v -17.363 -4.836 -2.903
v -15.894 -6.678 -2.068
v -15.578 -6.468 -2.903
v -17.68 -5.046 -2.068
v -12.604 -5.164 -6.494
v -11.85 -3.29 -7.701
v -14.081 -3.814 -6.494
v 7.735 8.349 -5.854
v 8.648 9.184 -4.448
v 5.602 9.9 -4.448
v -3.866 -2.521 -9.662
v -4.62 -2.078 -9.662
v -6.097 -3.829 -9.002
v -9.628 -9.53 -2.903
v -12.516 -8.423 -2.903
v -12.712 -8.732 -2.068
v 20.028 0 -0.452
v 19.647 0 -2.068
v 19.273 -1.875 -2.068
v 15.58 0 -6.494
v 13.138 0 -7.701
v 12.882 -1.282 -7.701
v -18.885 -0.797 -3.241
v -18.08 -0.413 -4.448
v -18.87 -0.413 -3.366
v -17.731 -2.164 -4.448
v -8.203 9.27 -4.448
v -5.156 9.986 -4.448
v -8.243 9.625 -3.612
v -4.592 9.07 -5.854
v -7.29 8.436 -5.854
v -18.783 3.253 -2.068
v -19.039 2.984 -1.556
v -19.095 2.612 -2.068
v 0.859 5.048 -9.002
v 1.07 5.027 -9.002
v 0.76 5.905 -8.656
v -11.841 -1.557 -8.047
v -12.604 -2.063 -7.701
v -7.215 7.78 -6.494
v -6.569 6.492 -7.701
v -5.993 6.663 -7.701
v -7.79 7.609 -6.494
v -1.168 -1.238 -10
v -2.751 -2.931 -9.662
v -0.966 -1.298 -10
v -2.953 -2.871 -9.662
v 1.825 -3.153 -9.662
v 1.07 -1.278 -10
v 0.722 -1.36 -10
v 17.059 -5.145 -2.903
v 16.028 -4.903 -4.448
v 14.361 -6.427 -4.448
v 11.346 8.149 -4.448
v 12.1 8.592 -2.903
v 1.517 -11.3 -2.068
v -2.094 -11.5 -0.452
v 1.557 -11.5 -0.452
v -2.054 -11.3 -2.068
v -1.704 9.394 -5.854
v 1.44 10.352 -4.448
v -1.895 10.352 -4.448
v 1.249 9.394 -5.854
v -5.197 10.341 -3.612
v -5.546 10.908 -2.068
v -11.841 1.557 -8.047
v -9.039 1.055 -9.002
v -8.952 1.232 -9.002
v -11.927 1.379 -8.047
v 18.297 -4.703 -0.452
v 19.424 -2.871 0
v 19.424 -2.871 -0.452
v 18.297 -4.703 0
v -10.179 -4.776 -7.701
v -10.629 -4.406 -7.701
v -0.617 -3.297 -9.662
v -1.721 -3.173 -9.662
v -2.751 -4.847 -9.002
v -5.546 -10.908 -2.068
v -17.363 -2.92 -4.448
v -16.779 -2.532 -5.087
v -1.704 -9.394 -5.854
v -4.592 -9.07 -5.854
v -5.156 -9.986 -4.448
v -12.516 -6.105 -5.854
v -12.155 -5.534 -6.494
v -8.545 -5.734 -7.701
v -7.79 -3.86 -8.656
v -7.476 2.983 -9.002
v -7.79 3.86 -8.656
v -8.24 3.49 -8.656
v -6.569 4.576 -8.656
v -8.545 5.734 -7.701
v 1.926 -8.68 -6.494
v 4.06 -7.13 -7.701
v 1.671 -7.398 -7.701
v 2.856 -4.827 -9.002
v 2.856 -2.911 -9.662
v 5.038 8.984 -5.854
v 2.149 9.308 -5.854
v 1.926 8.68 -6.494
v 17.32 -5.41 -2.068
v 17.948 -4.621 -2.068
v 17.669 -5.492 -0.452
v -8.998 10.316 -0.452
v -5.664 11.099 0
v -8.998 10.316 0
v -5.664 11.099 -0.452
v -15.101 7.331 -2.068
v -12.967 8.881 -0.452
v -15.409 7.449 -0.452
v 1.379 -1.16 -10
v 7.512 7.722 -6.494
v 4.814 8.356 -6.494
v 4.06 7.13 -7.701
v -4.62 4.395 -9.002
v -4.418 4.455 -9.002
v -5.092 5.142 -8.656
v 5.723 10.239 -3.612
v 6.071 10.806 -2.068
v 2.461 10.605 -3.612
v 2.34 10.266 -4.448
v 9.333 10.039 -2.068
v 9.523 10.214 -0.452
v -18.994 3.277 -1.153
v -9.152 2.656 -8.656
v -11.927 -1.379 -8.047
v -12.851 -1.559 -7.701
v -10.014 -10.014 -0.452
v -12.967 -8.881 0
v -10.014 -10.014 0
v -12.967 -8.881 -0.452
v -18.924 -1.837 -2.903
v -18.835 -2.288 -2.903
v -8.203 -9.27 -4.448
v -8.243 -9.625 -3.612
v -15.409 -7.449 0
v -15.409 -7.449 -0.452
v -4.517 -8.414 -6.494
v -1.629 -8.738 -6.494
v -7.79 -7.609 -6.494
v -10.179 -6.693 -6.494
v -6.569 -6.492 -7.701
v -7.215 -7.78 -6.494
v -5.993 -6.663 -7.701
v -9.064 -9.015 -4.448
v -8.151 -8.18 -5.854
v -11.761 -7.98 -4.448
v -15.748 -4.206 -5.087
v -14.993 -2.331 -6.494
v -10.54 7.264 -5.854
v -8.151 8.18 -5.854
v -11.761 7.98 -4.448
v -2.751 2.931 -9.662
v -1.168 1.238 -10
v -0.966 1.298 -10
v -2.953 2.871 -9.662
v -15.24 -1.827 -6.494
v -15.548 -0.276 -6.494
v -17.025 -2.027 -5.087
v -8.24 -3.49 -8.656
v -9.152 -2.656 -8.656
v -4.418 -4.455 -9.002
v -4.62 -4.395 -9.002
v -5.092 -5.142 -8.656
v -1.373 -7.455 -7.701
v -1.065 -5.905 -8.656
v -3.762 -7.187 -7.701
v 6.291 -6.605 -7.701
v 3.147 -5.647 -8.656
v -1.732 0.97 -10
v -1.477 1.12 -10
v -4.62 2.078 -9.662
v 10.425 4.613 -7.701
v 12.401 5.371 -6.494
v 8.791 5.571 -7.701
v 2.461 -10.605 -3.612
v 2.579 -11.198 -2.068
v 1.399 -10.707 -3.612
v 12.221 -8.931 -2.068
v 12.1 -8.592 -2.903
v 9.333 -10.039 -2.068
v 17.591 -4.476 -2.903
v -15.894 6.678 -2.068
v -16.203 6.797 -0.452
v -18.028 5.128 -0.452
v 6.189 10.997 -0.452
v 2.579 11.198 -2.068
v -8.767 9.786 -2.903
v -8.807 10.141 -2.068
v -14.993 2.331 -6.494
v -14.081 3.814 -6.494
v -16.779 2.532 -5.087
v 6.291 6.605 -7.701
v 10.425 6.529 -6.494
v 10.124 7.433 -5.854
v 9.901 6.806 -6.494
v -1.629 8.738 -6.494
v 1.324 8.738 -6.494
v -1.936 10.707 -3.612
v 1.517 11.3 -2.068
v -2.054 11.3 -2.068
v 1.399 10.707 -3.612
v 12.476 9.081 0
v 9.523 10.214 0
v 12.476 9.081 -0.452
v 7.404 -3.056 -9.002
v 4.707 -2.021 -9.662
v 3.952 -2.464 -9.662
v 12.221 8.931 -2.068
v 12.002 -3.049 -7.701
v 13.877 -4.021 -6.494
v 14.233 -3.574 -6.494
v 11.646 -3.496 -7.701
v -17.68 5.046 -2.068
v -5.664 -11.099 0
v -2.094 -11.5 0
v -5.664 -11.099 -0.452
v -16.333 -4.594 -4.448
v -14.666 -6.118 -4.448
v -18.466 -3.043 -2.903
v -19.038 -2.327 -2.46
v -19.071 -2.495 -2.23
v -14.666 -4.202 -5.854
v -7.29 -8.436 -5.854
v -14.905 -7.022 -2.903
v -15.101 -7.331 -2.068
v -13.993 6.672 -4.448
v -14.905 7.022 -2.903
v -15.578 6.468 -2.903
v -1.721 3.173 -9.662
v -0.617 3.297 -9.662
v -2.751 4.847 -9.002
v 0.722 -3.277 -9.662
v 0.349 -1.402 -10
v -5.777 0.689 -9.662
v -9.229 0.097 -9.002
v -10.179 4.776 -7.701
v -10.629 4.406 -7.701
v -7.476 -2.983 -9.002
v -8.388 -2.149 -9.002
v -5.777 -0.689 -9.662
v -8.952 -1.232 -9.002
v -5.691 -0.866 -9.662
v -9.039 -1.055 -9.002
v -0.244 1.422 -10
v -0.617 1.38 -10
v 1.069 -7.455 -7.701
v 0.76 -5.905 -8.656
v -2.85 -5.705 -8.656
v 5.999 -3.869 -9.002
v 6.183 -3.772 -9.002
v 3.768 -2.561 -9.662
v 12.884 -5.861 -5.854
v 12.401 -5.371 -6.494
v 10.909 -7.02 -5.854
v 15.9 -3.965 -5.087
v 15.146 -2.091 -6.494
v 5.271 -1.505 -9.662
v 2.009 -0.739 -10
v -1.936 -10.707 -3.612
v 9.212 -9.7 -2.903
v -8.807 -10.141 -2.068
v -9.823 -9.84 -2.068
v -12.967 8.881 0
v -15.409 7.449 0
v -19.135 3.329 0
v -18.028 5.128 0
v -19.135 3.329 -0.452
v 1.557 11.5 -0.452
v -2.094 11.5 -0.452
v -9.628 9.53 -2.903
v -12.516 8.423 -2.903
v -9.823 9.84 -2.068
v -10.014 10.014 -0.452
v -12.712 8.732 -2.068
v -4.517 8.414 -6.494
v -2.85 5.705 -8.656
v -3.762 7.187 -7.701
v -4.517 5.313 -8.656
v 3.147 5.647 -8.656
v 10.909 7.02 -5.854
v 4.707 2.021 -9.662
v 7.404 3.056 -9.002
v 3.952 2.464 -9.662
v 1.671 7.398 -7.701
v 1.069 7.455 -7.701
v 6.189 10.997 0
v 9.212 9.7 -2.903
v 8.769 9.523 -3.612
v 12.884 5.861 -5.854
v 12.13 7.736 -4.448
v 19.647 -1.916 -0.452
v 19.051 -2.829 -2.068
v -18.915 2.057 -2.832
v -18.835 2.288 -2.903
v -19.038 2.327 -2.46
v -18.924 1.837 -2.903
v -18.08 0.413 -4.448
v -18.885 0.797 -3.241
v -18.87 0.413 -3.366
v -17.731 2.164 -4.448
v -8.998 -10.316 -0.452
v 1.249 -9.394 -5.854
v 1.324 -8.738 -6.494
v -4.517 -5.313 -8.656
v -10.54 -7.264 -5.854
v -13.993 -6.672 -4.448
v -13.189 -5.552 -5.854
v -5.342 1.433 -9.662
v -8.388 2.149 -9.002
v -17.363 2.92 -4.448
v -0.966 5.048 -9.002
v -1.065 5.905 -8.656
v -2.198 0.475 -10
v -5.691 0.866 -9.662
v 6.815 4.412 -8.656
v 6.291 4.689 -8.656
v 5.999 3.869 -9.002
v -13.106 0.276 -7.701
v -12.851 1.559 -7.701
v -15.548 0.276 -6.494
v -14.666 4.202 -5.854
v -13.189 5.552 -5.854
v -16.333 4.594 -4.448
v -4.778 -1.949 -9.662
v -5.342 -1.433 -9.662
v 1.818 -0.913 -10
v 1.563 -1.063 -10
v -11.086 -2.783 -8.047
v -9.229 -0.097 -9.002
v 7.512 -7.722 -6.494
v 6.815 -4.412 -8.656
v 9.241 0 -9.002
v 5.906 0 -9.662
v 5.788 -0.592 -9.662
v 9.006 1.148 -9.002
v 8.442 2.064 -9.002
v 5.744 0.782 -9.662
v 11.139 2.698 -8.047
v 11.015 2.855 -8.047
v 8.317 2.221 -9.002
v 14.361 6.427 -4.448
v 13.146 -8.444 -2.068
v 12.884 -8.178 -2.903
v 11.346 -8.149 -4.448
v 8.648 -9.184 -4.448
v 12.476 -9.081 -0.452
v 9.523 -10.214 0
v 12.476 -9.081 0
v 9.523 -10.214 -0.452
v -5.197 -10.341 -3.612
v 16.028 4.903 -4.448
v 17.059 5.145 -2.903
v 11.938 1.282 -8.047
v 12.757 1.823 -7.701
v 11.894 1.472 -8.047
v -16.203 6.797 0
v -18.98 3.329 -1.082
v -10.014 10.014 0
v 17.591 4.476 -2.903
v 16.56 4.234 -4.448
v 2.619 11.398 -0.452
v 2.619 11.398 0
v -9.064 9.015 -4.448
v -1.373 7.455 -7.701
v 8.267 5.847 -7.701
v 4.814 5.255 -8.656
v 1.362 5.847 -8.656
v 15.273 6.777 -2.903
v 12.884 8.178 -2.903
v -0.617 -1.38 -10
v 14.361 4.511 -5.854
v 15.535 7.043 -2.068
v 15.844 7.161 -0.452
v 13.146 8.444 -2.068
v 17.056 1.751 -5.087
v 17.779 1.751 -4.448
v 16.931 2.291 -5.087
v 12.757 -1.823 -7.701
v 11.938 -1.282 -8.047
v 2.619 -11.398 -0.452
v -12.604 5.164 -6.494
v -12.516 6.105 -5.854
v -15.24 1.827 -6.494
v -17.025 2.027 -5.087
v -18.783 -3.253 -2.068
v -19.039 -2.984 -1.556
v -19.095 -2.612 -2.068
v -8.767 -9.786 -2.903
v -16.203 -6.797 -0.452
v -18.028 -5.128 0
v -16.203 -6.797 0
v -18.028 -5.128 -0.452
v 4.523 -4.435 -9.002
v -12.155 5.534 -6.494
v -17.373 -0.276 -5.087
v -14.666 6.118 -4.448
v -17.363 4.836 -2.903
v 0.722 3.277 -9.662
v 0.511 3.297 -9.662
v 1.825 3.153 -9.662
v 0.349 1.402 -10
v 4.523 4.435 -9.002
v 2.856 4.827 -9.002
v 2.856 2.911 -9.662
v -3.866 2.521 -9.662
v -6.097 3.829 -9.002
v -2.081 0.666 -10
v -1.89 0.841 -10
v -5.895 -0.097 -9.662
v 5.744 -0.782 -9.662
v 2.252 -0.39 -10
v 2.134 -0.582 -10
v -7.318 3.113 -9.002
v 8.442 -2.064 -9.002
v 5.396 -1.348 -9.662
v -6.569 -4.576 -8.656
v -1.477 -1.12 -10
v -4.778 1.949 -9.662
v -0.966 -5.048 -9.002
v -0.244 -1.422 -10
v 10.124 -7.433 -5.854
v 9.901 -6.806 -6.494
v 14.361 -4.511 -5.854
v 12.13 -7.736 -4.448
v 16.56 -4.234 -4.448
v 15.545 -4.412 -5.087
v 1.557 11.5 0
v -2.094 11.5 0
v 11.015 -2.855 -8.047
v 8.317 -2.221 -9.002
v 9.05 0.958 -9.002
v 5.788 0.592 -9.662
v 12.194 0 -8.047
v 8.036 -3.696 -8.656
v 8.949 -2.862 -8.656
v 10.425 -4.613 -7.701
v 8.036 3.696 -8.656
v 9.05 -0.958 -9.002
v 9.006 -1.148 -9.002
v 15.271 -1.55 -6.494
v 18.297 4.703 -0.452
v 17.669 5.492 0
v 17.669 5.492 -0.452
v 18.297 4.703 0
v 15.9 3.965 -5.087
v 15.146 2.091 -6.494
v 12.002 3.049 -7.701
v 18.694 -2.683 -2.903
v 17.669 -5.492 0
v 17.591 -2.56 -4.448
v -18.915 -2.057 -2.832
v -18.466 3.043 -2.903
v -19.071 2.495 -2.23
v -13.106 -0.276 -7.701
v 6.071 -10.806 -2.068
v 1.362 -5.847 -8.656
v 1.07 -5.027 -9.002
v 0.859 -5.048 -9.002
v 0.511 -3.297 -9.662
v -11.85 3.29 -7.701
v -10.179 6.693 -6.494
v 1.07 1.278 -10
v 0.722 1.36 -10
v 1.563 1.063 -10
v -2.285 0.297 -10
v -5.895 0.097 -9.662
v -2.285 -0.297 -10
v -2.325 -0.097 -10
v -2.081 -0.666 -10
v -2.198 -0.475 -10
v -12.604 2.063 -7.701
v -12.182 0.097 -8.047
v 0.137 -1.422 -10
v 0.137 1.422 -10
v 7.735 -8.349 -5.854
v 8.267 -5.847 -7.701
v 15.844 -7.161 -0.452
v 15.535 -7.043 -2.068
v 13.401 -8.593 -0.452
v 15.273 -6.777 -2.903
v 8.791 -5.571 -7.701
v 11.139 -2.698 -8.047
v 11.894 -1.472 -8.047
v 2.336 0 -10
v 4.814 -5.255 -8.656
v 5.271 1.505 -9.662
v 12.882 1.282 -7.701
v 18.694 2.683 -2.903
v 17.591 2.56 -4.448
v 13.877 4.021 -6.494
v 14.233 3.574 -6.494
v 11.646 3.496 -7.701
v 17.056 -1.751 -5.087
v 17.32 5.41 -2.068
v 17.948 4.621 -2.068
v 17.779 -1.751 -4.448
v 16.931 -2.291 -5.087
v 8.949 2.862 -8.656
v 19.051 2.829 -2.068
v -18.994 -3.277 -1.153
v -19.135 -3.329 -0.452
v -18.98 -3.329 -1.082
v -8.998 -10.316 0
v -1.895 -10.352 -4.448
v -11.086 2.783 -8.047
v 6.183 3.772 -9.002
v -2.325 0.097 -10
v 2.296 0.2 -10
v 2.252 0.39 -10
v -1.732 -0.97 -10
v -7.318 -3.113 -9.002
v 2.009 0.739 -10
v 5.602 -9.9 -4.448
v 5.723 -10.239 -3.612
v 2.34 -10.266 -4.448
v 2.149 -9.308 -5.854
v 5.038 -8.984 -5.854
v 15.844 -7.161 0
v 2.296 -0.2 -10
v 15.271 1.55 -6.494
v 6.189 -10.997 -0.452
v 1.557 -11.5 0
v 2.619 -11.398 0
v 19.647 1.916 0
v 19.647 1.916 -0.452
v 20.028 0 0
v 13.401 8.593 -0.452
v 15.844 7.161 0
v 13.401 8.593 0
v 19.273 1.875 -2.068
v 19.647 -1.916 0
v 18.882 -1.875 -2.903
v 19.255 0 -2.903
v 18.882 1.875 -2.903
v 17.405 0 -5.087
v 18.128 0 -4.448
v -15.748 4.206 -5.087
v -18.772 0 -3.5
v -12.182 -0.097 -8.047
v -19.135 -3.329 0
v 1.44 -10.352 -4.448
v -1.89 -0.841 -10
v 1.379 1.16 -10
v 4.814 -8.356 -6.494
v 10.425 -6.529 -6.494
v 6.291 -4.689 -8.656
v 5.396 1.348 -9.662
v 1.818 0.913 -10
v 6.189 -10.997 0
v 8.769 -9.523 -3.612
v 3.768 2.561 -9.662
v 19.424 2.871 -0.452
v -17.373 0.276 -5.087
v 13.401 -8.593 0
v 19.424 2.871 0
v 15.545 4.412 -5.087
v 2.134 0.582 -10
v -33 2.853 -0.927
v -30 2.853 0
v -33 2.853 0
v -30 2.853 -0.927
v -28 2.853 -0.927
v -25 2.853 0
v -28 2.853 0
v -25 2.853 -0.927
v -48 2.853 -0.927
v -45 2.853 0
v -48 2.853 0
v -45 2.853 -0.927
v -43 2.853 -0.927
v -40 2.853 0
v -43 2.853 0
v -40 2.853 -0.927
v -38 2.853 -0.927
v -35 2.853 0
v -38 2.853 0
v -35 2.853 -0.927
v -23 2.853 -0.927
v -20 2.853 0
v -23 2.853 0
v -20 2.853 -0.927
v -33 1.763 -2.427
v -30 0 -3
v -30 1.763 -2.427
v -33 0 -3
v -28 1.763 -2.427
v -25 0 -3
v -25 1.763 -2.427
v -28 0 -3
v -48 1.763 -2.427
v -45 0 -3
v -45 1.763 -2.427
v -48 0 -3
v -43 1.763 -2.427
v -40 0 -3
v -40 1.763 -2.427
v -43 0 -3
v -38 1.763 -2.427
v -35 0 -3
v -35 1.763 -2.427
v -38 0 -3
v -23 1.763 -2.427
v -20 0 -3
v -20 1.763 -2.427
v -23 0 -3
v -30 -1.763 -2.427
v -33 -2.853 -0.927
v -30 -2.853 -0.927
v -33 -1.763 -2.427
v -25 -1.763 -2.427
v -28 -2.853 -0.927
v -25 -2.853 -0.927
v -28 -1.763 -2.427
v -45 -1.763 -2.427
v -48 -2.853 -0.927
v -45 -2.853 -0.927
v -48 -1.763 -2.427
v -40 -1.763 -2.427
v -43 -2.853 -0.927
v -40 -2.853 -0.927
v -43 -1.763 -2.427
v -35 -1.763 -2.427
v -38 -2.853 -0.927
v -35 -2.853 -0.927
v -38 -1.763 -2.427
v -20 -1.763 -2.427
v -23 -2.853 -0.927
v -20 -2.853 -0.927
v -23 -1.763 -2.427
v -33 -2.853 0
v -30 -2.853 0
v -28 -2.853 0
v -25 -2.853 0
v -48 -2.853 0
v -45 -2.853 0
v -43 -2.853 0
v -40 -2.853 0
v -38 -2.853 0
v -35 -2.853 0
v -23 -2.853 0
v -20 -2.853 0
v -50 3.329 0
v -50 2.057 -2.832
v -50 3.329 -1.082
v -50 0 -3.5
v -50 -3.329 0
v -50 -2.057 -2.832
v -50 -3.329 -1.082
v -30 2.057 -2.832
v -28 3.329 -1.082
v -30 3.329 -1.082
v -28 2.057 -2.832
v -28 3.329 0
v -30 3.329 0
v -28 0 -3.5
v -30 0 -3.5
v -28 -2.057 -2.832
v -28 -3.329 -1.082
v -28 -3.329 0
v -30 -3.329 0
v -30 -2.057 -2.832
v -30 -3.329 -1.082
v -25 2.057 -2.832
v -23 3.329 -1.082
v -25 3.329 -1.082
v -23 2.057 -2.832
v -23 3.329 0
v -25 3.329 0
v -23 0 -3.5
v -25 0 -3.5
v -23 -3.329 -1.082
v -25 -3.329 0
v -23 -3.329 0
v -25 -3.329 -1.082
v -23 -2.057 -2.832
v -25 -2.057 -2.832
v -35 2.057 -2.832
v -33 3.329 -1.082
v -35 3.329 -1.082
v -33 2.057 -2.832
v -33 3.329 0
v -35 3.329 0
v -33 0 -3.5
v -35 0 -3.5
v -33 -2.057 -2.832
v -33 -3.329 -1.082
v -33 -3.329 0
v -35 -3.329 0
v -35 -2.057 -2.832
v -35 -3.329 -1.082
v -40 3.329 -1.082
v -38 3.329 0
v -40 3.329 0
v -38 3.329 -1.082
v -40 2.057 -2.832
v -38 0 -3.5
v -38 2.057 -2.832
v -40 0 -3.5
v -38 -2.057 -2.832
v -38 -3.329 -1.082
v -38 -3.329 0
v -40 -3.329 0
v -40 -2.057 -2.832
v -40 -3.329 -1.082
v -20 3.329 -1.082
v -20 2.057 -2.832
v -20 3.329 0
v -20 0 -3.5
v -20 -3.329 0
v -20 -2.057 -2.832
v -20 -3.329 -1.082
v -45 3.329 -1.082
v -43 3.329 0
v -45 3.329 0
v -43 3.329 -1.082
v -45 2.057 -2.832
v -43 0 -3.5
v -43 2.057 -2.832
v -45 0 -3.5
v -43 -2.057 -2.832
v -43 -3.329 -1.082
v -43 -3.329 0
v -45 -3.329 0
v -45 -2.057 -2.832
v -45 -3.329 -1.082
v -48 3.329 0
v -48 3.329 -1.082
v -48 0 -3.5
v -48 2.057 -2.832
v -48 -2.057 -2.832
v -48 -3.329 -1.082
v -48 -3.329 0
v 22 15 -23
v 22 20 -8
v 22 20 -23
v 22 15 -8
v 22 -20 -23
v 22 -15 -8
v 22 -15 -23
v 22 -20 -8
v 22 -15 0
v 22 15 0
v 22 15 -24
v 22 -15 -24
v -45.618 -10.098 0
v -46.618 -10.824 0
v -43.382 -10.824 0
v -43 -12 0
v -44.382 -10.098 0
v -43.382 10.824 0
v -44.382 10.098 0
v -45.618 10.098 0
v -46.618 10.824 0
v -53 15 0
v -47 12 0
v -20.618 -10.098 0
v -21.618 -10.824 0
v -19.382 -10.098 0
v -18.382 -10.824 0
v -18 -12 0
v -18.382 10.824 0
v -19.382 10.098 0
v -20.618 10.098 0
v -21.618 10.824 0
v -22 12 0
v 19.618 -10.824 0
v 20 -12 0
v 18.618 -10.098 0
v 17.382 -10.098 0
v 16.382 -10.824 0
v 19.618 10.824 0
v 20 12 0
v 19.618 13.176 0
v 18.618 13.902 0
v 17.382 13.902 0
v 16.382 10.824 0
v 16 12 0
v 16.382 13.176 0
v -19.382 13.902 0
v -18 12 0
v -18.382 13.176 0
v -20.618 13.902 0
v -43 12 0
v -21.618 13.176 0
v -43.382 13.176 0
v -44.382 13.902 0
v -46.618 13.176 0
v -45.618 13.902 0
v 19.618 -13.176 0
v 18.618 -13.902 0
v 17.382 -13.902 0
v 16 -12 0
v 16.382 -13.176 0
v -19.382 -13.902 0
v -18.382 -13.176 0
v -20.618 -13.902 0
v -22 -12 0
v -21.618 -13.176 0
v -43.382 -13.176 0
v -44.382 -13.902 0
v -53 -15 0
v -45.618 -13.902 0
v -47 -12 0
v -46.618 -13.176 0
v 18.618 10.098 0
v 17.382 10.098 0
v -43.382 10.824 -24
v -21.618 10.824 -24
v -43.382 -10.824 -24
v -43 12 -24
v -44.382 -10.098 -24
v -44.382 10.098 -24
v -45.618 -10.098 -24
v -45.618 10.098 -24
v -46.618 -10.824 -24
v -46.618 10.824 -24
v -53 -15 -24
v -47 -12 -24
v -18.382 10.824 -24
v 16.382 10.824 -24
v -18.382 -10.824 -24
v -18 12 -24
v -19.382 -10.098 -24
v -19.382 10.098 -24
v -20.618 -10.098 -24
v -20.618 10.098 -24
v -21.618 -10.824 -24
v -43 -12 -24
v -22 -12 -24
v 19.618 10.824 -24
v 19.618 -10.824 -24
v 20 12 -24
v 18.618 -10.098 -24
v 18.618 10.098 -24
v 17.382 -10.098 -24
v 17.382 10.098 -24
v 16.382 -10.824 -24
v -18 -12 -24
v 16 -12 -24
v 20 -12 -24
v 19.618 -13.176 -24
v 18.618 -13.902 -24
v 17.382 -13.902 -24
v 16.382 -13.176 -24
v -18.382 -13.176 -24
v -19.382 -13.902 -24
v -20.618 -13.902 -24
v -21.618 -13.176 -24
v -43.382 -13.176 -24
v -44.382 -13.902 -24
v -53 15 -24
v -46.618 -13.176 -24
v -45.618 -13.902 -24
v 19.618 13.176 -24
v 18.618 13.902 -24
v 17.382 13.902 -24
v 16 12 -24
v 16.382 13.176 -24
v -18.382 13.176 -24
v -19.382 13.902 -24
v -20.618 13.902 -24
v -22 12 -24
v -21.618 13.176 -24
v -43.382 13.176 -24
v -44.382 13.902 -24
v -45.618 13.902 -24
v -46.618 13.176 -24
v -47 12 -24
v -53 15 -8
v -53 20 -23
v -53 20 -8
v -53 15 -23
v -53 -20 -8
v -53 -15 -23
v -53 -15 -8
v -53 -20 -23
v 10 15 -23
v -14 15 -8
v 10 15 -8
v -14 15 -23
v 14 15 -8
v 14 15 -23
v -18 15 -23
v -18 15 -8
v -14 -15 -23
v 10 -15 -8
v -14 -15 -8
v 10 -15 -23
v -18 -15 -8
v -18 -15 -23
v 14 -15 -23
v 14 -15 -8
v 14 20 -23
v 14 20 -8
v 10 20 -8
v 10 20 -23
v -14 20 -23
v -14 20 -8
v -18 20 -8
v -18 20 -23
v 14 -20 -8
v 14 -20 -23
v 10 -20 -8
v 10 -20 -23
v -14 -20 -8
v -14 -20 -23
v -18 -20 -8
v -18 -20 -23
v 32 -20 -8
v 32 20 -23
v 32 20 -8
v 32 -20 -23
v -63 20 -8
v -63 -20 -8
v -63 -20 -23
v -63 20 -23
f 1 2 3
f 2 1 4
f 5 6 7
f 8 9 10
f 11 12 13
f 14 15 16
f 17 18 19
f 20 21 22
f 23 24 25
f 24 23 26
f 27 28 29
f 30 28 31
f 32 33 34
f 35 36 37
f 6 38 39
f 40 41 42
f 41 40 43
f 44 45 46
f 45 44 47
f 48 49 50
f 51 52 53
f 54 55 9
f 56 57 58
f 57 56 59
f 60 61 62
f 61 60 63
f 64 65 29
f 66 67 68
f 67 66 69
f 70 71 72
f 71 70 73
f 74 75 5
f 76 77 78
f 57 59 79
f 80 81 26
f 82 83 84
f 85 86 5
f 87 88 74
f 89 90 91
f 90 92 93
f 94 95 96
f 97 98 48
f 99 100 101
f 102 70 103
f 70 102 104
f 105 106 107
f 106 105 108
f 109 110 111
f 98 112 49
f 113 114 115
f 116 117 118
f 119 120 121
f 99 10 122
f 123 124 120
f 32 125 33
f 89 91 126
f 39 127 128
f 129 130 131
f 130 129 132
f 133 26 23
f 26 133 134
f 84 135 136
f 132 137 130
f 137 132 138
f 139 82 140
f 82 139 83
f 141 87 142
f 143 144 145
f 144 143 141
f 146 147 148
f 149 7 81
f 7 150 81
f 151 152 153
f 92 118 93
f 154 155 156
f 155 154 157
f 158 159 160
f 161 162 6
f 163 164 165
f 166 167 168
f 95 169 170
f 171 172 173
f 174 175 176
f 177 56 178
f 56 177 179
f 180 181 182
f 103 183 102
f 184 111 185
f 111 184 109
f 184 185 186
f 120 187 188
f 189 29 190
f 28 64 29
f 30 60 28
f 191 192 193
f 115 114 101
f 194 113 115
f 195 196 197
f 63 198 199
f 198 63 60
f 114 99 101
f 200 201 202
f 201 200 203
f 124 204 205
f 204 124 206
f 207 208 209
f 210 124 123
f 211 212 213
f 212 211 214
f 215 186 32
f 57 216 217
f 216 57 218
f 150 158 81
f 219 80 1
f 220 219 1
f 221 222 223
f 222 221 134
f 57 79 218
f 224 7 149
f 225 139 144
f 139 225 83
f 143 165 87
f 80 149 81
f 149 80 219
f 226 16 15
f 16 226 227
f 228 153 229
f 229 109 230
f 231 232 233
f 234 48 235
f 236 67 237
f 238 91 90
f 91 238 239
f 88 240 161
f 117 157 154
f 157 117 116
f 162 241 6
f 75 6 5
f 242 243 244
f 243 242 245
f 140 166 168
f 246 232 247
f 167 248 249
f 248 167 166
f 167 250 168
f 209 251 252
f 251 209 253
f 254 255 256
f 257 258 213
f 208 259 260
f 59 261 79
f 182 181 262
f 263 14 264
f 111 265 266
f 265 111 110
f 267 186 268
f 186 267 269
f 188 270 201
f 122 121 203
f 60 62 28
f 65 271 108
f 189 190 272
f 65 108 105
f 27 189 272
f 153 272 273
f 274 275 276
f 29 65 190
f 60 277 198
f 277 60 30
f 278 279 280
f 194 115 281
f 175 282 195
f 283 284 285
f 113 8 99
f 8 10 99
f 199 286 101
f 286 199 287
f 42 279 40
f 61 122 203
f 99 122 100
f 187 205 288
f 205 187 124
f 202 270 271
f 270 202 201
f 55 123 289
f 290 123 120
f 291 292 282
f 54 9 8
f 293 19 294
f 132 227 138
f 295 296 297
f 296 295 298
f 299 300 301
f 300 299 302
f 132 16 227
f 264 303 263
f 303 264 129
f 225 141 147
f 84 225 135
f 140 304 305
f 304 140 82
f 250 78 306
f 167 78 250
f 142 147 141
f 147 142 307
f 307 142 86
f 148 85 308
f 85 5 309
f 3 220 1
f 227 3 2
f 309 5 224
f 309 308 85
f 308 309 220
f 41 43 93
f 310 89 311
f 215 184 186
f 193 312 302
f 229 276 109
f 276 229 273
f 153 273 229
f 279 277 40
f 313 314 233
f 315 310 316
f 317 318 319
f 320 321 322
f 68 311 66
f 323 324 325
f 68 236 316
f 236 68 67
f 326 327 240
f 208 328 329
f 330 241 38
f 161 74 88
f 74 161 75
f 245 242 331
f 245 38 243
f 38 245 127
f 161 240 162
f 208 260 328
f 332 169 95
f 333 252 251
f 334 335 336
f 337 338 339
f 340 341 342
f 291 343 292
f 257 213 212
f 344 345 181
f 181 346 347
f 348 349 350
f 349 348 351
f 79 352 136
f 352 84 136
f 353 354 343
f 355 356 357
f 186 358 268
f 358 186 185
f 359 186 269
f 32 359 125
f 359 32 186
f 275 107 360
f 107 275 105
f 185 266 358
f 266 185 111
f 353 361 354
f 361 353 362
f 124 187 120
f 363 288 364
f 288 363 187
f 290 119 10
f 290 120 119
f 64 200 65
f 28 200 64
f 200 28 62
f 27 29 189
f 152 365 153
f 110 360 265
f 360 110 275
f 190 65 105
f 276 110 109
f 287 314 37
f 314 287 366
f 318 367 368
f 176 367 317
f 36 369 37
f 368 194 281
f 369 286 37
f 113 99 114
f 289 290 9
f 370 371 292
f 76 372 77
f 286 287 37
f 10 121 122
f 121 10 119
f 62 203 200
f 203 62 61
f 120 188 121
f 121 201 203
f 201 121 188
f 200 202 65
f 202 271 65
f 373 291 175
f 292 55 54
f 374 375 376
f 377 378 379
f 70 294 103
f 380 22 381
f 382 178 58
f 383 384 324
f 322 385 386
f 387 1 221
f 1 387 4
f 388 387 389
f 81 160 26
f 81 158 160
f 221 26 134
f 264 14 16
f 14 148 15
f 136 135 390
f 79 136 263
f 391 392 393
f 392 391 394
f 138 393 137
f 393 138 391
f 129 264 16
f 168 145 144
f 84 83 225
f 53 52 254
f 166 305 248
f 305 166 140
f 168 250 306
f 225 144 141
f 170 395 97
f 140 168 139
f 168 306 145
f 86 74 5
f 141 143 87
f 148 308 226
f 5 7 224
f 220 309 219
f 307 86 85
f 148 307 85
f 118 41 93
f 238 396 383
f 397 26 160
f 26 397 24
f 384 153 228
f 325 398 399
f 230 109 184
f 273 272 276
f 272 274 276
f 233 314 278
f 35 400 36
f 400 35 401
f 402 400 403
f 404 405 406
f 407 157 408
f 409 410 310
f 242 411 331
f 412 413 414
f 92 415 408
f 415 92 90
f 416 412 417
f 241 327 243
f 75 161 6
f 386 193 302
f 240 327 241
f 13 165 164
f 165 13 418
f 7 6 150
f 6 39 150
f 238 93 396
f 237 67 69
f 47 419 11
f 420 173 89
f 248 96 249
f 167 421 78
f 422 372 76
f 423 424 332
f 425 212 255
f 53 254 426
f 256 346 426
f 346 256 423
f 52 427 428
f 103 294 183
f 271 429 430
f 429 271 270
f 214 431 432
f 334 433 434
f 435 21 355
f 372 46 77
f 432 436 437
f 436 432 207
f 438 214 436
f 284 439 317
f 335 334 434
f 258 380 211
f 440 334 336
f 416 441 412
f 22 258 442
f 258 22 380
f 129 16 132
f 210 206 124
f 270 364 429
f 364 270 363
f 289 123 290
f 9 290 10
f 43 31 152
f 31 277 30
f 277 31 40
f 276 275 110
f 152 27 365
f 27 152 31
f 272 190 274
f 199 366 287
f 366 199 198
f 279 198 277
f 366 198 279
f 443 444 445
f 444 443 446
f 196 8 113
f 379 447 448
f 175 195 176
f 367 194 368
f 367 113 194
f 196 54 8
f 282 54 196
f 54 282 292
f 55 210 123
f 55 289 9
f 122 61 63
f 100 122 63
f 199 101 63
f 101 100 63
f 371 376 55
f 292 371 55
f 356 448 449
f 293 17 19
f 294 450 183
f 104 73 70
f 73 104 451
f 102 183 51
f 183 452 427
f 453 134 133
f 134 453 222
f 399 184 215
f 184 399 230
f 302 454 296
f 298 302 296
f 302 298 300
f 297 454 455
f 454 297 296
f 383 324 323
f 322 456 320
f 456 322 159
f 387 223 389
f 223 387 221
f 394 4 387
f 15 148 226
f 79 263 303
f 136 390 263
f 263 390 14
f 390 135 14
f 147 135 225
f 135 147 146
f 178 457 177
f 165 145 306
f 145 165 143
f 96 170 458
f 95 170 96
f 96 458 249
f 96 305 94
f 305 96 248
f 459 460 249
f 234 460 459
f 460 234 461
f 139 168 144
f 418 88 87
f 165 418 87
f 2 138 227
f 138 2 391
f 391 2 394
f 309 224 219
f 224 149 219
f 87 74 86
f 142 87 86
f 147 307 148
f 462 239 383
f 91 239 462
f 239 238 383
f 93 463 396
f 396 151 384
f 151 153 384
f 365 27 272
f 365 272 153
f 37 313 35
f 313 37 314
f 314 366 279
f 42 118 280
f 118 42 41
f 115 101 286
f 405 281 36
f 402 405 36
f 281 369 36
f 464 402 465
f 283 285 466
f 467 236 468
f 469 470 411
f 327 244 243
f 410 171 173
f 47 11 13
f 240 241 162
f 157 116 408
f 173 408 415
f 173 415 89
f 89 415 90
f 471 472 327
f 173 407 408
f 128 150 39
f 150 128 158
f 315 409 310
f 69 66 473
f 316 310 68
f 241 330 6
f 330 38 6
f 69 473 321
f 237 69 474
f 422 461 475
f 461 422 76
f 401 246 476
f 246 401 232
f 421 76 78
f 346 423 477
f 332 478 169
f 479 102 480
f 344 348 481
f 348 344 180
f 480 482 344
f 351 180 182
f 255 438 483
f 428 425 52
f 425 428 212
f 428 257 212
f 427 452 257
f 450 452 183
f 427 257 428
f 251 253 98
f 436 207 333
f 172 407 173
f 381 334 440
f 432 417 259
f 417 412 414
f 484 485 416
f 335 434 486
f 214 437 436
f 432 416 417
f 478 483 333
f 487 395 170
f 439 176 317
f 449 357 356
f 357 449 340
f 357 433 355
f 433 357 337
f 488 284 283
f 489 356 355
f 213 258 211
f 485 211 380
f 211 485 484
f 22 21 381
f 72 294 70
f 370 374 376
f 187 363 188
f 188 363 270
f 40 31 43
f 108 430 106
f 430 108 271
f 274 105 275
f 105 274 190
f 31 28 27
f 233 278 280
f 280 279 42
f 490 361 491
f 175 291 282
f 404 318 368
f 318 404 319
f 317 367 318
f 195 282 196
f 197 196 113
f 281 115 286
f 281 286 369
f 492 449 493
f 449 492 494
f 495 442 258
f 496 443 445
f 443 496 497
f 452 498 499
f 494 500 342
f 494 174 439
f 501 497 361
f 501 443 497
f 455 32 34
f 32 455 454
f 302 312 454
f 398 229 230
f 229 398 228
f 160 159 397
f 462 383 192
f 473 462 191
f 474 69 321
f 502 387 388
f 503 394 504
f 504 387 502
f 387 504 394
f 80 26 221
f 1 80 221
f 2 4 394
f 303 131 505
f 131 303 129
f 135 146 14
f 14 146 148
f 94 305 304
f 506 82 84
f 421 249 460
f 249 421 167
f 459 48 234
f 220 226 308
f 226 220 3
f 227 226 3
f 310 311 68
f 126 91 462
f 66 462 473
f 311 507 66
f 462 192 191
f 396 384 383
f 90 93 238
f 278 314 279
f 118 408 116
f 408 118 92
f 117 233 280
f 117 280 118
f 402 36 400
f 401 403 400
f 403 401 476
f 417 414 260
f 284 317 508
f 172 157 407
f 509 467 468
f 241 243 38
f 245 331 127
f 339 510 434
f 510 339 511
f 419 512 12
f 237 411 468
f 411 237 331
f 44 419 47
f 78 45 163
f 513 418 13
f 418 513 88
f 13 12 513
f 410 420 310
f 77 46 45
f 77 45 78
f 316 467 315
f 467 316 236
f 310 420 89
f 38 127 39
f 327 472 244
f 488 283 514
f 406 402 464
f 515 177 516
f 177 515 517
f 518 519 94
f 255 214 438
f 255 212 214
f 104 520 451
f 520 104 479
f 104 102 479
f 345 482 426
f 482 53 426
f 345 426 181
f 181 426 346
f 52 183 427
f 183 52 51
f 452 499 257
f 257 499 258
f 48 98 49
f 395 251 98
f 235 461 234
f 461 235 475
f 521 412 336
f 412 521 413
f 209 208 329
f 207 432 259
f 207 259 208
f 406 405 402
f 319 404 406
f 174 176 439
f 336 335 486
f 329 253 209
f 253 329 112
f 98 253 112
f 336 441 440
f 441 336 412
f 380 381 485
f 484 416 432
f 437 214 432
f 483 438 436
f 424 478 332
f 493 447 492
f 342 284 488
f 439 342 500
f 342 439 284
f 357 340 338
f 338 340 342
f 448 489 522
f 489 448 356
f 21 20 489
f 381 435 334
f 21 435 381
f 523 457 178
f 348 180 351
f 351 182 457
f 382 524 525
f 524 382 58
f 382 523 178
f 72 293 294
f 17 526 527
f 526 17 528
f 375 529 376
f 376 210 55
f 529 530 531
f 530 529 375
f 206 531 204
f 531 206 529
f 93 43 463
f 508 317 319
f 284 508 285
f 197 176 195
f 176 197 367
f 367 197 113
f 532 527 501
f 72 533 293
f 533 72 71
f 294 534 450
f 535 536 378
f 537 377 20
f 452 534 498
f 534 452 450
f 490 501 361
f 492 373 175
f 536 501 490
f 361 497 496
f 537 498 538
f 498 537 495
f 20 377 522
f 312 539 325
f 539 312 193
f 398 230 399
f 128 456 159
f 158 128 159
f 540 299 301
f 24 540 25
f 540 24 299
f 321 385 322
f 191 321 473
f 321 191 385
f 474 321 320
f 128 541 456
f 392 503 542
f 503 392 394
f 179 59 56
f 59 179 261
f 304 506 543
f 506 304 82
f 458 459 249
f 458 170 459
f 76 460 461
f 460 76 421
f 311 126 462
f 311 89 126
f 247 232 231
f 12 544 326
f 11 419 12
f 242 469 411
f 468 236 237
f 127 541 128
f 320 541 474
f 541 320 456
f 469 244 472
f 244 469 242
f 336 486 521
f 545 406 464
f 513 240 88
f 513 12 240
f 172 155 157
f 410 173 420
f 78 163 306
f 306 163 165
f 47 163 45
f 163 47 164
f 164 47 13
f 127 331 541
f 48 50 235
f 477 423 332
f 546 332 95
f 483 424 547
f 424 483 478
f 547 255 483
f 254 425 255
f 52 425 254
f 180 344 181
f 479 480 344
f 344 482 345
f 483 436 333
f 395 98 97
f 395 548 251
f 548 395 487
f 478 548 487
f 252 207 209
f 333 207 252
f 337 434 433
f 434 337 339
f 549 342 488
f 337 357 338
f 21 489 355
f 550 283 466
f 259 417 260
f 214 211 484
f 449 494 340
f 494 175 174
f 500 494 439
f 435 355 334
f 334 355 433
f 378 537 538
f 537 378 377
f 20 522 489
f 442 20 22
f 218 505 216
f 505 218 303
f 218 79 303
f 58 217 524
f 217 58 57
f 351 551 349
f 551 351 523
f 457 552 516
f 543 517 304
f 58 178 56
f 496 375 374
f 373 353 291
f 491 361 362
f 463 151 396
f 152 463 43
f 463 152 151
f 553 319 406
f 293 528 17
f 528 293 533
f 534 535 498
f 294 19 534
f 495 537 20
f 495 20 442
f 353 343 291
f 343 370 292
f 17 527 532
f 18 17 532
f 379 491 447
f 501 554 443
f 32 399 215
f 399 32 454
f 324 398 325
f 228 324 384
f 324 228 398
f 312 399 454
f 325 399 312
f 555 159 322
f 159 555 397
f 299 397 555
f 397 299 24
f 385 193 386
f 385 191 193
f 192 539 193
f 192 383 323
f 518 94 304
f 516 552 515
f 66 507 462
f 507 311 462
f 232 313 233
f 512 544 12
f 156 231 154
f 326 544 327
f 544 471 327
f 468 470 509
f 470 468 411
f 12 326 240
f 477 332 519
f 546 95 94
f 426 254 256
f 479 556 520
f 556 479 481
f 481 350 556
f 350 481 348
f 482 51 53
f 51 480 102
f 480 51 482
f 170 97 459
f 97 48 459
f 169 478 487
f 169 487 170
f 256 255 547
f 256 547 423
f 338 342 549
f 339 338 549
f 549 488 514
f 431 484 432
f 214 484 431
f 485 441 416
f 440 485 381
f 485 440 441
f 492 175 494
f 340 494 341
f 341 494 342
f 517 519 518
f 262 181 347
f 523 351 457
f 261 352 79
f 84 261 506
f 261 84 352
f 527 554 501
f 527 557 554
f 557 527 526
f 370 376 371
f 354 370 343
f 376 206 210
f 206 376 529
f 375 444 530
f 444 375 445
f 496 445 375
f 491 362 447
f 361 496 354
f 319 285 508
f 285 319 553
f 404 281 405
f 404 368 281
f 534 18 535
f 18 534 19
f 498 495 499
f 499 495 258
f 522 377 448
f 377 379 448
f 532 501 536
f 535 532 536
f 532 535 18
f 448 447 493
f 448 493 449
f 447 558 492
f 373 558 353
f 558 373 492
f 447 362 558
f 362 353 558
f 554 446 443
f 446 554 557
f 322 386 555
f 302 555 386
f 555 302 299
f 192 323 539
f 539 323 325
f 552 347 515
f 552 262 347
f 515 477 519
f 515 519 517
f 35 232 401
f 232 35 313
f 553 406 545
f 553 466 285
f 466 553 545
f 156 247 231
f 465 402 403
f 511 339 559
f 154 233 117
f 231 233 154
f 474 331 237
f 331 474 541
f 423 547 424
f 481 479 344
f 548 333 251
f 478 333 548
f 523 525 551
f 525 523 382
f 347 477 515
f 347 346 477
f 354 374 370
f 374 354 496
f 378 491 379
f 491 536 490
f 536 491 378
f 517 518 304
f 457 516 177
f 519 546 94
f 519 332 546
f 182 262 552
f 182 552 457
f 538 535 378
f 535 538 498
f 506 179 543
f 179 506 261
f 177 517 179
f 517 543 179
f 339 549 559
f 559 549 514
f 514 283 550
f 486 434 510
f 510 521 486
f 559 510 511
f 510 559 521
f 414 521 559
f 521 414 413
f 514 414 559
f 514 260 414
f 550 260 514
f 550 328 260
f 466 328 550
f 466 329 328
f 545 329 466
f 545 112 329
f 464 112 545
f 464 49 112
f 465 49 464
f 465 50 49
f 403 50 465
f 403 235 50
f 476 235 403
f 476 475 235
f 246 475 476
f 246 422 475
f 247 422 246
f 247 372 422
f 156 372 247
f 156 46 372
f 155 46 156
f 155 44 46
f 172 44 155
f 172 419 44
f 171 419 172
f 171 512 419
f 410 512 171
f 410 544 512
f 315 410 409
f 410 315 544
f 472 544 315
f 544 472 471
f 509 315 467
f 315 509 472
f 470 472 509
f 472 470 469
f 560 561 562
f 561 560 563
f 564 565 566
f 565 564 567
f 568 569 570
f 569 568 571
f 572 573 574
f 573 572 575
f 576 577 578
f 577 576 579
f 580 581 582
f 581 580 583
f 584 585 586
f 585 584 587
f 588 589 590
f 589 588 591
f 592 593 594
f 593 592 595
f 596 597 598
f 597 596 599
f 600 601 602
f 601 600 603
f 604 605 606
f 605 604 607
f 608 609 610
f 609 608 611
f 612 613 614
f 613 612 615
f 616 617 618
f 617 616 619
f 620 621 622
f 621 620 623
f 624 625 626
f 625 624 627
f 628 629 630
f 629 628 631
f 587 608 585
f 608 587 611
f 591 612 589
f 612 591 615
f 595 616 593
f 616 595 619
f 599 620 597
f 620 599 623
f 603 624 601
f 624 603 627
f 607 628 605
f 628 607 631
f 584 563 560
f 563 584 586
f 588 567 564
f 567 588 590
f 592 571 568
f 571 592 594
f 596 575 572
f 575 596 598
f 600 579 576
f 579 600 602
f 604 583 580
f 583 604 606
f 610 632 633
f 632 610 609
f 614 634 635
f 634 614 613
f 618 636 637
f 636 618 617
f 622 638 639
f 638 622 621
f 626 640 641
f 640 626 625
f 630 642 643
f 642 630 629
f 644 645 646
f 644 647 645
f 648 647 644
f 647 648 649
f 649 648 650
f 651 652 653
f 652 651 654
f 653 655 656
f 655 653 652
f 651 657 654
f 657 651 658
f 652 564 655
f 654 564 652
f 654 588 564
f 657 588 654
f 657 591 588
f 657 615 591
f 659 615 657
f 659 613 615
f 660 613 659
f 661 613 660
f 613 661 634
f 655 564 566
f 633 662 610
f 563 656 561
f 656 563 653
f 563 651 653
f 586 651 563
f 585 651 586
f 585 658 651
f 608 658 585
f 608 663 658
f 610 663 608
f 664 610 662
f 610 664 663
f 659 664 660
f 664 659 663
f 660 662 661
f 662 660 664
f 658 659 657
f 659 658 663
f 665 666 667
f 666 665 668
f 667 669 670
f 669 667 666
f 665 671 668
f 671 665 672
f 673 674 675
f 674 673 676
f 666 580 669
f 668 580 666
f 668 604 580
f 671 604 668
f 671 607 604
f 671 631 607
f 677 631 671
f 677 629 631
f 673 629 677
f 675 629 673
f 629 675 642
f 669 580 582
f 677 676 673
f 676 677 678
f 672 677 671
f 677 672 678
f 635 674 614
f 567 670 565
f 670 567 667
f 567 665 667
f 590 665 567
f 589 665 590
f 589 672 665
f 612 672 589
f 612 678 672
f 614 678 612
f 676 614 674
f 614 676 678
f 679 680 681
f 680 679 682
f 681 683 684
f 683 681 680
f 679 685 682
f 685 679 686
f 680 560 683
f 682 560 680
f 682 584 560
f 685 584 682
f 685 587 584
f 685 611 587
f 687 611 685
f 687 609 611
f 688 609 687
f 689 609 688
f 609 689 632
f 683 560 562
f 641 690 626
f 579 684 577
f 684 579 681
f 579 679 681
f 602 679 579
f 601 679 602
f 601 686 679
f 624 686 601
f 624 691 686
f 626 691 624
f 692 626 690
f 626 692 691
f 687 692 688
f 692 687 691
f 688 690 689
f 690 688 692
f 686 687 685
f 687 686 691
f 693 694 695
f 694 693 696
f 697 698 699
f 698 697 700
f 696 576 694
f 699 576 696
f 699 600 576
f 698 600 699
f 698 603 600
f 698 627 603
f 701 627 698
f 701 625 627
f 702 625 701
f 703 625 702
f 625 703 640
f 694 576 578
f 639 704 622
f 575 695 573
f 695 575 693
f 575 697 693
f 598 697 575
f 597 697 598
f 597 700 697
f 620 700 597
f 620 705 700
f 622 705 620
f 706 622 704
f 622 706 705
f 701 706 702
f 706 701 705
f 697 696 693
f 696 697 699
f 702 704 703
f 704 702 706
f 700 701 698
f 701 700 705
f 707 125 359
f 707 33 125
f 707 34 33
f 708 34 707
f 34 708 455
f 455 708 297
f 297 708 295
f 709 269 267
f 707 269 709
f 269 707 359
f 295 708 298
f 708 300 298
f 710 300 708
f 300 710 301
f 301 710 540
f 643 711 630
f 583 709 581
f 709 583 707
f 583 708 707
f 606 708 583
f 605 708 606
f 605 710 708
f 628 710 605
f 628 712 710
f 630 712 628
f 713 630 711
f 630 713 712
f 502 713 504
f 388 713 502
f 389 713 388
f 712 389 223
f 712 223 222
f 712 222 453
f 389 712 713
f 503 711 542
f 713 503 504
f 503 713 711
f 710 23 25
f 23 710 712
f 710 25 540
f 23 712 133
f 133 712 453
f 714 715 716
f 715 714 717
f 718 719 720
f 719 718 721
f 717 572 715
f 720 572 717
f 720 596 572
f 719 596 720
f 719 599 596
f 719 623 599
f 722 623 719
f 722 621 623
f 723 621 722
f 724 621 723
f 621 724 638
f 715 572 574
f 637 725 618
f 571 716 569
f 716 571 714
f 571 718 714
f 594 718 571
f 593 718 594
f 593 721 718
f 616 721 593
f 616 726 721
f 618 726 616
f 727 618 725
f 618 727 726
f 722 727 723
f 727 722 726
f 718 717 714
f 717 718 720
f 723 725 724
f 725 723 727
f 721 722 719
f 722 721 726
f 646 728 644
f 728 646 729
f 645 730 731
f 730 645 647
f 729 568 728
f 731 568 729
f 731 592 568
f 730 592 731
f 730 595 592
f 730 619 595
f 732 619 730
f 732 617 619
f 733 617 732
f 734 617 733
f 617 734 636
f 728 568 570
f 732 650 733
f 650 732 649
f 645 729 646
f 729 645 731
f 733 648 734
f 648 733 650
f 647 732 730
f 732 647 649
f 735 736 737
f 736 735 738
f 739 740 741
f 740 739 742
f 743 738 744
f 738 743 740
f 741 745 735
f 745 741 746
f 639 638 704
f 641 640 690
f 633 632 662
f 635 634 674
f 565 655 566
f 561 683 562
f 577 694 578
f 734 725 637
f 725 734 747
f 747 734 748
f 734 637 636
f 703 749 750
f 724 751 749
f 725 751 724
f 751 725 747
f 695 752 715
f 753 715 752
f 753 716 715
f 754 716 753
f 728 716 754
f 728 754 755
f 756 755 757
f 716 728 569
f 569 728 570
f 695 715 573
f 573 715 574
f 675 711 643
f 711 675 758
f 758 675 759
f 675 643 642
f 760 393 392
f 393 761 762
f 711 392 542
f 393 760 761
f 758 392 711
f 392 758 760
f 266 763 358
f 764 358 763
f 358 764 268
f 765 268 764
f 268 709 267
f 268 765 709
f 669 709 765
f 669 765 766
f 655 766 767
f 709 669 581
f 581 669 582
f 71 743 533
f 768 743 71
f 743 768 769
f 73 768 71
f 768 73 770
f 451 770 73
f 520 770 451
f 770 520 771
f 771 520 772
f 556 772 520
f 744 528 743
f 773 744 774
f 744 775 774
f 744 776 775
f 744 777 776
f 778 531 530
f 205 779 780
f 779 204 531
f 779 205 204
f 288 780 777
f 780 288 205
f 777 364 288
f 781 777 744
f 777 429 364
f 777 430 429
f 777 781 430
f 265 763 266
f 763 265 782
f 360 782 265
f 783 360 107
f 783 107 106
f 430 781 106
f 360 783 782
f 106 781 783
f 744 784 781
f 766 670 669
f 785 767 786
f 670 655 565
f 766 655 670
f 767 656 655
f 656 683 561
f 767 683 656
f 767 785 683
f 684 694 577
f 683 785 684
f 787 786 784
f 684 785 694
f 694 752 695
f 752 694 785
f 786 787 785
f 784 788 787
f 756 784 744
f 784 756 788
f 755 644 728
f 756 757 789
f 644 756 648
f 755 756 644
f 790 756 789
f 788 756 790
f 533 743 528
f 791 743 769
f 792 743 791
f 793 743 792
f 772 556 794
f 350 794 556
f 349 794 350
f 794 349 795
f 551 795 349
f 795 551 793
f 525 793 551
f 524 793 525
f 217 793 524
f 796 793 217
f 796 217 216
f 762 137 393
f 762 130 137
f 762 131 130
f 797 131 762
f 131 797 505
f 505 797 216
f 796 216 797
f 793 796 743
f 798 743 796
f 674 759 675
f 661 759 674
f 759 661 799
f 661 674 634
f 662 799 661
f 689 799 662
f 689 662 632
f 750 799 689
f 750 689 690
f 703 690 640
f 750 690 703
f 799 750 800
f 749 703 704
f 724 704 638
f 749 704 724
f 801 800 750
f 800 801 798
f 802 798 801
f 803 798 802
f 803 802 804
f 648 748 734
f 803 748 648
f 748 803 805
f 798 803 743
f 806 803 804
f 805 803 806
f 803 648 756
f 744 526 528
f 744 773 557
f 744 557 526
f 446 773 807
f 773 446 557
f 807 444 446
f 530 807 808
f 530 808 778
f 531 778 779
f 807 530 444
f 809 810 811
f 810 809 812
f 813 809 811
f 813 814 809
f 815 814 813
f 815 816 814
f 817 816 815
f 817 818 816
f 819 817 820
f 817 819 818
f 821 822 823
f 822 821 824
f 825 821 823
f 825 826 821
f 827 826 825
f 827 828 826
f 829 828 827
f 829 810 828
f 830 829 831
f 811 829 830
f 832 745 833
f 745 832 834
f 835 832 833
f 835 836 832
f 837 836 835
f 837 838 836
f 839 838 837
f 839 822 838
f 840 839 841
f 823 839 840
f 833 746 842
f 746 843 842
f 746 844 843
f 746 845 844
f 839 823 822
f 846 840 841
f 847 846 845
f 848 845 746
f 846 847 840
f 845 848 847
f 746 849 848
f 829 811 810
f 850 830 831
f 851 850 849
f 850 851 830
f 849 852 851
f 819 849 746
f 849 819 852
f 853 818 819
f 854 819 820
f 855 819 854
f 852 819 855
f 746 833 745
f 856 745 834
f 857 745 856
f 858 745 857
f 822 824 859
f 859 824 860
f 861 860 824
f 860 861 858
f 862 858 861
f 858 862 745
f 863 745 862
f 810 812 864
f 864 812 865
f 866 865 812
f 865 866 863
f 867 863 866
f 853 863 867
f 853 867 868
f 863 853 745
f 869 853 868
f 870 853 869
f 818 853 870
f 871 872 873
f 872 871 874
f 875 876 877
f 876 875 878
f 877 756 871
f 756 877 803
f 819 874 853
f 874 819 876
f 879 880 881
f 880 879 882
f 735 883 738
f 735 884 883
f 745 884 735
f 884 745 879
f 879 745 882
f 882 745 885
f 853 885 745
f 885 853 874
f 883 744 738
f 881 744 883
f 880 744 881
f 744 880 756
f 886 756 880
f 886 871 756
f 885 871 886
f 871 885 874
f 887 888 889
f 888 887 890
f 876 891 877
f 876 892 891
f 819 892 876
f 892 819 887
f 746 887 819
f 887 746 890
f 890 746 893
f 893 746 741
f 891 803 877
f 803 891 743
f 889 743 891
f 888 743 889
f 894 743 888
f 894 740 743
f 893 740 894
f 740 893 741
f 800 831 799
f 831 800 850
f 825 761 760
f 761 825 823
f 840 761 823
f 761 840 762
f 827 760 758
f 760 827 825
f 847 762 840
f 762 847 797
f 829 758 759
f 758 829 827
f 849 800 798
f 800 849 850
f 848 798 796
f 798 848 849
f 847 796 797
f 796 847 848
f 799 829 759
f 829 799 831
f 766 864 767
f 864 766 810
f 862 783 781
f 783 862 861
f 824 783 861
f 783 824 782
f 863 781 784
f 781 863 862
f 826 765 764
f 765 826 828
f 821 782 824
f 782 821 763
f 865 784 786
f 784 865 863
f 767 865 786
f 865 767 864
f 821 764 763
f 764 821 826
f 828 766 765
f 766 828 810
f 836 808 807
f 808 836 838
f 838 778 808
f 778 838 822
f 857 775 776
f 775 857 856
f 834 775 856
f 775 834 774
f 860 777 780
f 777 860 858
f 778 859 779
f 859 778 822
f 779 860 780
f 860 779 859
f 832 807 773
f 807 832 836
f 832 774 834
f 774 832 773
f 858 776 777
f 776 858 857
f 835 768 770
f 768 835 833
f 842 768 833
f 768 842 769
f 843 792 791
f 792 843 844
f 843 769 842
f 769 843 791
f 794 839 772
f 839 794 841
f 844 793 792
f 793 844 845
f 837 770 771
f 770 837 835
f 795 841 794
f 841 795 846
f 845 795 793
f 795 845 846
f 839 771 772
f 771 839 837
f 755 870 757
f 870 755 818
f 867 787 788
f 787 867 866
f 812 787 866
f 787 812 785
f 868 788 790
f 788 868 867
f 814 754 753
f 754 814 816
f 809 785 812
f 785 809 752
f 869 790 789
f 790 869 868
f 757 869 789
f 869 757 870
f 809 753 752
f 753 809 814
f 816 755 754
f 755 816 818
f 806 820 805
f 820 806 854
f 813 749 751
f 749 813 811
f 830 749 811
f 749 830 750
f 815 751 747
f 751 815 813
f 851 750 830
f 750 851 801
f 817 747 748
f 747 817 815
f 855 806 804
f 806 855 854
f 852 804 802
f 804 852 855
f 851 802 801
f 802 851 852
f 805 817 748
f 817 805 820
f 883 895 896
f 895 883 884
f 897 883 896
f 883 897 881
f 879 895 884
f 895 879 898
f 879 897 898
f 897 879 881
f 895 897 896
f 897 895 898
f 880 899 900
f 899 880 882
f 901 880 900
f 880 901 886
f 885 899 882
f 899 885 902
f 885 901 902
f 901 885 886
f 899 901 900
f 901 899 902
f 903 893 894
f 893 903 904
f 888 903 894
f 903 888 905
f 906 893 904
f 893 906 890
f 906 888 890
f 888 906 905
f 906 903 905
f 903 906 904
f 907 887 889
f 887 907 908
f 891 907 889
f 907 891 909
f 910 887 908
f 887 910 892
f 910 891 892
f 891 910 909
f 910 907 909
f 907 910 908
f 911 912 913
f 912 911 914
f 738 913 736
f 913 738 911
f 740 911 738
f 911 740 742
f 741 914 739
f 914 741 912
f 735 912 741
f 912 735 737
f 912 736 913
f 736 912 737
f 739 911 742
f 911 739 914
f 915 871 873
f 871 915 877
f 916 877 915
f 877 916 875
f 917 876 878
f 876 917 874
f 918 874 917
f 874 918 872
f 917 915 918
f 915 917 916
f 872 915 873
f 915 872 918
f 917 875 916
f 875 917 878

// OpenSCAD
length = 40;
width = 23;
height = 20;
wood_cutout_for_connection = 8;
connection_width = 4;
module form() {
    resize([length,width,height]) minkowski() {
        resize([length,width,height]) sphere(1, $fn=30);
        sphere(3, $fn=15);
    }
    translate([-50,0,0]) rotate([0,90,0]) cylinder(d=6,h=40, $fn=10);
    translate([-30,0,0]) rotate([0,90,0]) cylinder(d=7,h=2, $fn=10);
    translate([-25,0,0]) rotate([0,90,0]) cylinder(d=7,h=2, $fn=10);
    translate([-35,0,0]) rotate([0,90,0]) cylinder(d=7,h=2, $fn=10);
    translate([-40,0,0]) rotate([0,90,0]) cylinder(d=7,h=2, $fn=10);
    translate([-20,0,0]) rotate([0,90,0]) cylinder(d=7,h=2, $fn=10);
    translate([-45,0,0]) rotate([0,90,0]) cylinder(d=7,h=2, $fn=10);
    translate([-50,0,0]) rotate([0,90,0]) cylinder(d=7,h=2, $fn=10);
}
difference() {
    translate([-53, -15, -24]) cube([75,30,24]);
    form();
    // top cutout for filling/
    //translate([-12.5, -7.5, -43]) cube([25,15,40]);
    translate([-20, -12, -50]) cylinder(d=4,h=100, $fn=10);
    translate([-20, 12, -50]) cylinder(d=4,h=100, $fn=10);
    translate([18, 12, -50]) cylinder(d=4,h=100, $fn=10);
    translate([18, -12, -50]) cylinder(d=4,h=100, $fn=10);
    translate([-45, 12, -50]) cylinder(d=4,h=100, $fn=10);
    translate([-45, -12, -50]) cylinder(d=4,h=100, $fn=10);
}

translate([10, 15, -15 - wood_cutout_for_connection]) cube([connection_width, 5, 15]);
translate([-18, 15, -15 - wood_cutout_for_connection]) cube([connection_width, 5, 15]);
translate([10, -20, -15 - wood_cutout_for_connection]) cube([connection_width, 5, 15]);
translate([-18, -20, -15 - wood_cutout_for_connection]) cube([connection_width, 5, 15]);
translate([22, -20, -15 - wood_cutout_for_connection]) cube([10, 40, 15]);
translate([-63, -20, -15 - wood_cutout_for_connection]) cube([10, 40, 15]);
//rotate([180, 0, 0]) difference() {
//    translate([-35, -15, 0]) cube([60,30,3]);
//    form();
//}

// form();
 //color("grey") cube([25,14,7], center=true);
